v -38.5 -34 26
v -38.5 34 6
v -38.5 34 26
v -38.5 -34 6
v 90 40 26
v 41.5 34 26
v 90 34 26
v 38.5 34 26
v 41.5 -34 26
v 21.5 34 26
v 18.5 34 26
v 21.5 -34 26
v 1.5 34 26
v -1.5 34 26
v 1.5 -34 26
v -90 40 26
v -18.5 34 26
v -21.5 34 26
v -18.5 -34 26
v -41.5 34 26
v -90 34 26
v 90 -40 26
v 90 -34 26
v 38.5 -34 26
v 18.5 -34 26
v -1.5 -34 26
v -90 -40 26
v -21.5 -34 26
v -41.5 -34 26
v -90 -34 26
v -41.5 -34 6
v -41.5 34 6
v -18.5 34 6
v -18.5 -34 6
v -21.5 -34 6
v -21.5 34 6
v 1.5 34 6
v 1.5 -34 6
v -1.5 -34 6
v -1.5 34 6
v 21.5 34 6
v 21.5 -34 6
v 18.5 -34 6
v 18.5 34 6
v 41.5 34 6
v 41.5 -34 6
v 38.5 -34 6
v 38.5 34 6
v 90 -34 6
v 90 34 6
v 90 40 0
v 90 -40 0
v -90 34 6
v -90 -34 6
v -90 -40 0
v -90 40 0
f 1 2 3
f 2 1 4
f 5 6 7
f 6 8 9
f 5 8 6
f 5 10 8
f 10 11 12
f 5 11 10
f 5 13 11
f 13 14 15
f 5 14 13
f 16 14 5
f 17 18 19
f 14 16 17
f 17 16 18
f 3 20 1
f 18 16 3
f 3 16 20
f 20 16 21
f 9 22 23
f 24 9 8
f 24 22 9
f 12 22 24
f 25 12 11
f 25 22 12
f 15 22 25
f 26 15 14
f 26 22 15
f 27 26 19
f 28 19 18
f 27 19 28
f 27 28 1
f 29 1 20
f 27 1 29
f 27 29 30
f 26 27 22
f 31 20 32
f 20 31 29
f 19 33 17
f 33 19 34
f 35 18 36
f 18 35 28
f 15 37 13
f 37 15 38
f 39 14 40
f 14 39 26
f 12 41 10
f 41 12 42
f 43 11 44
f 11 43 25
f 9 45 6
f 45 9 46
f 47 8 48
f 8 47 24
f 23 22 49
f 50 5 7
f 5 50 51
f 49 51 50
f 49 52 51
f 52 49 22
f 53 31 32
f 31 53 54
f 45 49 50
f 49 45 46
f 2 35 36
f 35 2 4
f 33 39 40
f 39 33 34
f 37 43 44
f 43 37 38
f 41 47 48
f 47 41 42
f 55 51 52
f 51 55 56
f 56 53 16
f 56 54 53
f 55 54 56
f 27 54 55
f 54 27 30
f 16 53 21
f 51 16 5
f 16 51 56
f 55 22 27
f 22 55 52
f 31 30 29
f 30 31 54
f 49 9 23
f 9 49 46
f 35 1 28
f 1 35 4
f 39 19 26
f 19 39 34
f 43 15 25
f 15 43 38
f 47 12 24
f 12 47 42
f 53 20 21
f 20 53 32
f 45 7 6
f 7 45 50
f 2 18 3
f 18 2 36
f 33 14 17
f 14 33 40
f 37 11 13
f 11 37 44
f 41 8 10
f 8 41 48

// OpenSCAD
$fn = 32;

// ----------------------------------------------------------------------
// Rib frame 180 x 80 x 26
// 5 ribs at 20 mm pitch
// ----------------------------------------------------------------------

// --- parameters (mm) ---
frame = [180, 80, 6];  // base plate size (x, y, z)
rail_w = 6;            // side rail width
ribs = 5;              // number of ribs
rib_t = 3;             // rib thickness
rib_h = 20;            // rib height above the base plate
pitch = 20;            // pitch between rib centres

// --- derived feature positions (mm) ---
span = (ribs - 1) * pitch;          // = 80   distance between the outer ribs
origin_x = -span / 2;               // = -40   X of the first rib
rib_len = frame[1] - 2 * rail_w + 2;  // = 70   rib length, 1 mm into each rail
feature_centers = [
  [origin_x + 0 * pitch, 0],
  [origin_x + 1 * pitch, 0],
  [origin_x + 2 * pitch, 0],
  [origin_x + 3 * pitch, 0],
  [origin_x + 4 * pitch, 0]
];   // rib centre line, drives the rib loop

// base plate, two side rails, then the ribs read straight off feature_centers
union() {
  translate([-frame[0] / 2, -frame[1] / 2, 0]) cube(frame);
  translate([-frame[0] / 2, -frame[1] / 2, 0]) cube([frame[0], rail_w, frame[2] + rib_h]);
  translate([-frame[0] / 2, frame[1] / 2 - rail_w, 0]) cube([frame[0], rail_w, frame[2] + rib_h]);
  for (centre = feature_centers)
    translate([centre[0] - rib_t / 2, centre[1] - rib_len / 2, frame[2] - 1])
      cube([rib_t, rib_len, rib_h + 1]);
}
